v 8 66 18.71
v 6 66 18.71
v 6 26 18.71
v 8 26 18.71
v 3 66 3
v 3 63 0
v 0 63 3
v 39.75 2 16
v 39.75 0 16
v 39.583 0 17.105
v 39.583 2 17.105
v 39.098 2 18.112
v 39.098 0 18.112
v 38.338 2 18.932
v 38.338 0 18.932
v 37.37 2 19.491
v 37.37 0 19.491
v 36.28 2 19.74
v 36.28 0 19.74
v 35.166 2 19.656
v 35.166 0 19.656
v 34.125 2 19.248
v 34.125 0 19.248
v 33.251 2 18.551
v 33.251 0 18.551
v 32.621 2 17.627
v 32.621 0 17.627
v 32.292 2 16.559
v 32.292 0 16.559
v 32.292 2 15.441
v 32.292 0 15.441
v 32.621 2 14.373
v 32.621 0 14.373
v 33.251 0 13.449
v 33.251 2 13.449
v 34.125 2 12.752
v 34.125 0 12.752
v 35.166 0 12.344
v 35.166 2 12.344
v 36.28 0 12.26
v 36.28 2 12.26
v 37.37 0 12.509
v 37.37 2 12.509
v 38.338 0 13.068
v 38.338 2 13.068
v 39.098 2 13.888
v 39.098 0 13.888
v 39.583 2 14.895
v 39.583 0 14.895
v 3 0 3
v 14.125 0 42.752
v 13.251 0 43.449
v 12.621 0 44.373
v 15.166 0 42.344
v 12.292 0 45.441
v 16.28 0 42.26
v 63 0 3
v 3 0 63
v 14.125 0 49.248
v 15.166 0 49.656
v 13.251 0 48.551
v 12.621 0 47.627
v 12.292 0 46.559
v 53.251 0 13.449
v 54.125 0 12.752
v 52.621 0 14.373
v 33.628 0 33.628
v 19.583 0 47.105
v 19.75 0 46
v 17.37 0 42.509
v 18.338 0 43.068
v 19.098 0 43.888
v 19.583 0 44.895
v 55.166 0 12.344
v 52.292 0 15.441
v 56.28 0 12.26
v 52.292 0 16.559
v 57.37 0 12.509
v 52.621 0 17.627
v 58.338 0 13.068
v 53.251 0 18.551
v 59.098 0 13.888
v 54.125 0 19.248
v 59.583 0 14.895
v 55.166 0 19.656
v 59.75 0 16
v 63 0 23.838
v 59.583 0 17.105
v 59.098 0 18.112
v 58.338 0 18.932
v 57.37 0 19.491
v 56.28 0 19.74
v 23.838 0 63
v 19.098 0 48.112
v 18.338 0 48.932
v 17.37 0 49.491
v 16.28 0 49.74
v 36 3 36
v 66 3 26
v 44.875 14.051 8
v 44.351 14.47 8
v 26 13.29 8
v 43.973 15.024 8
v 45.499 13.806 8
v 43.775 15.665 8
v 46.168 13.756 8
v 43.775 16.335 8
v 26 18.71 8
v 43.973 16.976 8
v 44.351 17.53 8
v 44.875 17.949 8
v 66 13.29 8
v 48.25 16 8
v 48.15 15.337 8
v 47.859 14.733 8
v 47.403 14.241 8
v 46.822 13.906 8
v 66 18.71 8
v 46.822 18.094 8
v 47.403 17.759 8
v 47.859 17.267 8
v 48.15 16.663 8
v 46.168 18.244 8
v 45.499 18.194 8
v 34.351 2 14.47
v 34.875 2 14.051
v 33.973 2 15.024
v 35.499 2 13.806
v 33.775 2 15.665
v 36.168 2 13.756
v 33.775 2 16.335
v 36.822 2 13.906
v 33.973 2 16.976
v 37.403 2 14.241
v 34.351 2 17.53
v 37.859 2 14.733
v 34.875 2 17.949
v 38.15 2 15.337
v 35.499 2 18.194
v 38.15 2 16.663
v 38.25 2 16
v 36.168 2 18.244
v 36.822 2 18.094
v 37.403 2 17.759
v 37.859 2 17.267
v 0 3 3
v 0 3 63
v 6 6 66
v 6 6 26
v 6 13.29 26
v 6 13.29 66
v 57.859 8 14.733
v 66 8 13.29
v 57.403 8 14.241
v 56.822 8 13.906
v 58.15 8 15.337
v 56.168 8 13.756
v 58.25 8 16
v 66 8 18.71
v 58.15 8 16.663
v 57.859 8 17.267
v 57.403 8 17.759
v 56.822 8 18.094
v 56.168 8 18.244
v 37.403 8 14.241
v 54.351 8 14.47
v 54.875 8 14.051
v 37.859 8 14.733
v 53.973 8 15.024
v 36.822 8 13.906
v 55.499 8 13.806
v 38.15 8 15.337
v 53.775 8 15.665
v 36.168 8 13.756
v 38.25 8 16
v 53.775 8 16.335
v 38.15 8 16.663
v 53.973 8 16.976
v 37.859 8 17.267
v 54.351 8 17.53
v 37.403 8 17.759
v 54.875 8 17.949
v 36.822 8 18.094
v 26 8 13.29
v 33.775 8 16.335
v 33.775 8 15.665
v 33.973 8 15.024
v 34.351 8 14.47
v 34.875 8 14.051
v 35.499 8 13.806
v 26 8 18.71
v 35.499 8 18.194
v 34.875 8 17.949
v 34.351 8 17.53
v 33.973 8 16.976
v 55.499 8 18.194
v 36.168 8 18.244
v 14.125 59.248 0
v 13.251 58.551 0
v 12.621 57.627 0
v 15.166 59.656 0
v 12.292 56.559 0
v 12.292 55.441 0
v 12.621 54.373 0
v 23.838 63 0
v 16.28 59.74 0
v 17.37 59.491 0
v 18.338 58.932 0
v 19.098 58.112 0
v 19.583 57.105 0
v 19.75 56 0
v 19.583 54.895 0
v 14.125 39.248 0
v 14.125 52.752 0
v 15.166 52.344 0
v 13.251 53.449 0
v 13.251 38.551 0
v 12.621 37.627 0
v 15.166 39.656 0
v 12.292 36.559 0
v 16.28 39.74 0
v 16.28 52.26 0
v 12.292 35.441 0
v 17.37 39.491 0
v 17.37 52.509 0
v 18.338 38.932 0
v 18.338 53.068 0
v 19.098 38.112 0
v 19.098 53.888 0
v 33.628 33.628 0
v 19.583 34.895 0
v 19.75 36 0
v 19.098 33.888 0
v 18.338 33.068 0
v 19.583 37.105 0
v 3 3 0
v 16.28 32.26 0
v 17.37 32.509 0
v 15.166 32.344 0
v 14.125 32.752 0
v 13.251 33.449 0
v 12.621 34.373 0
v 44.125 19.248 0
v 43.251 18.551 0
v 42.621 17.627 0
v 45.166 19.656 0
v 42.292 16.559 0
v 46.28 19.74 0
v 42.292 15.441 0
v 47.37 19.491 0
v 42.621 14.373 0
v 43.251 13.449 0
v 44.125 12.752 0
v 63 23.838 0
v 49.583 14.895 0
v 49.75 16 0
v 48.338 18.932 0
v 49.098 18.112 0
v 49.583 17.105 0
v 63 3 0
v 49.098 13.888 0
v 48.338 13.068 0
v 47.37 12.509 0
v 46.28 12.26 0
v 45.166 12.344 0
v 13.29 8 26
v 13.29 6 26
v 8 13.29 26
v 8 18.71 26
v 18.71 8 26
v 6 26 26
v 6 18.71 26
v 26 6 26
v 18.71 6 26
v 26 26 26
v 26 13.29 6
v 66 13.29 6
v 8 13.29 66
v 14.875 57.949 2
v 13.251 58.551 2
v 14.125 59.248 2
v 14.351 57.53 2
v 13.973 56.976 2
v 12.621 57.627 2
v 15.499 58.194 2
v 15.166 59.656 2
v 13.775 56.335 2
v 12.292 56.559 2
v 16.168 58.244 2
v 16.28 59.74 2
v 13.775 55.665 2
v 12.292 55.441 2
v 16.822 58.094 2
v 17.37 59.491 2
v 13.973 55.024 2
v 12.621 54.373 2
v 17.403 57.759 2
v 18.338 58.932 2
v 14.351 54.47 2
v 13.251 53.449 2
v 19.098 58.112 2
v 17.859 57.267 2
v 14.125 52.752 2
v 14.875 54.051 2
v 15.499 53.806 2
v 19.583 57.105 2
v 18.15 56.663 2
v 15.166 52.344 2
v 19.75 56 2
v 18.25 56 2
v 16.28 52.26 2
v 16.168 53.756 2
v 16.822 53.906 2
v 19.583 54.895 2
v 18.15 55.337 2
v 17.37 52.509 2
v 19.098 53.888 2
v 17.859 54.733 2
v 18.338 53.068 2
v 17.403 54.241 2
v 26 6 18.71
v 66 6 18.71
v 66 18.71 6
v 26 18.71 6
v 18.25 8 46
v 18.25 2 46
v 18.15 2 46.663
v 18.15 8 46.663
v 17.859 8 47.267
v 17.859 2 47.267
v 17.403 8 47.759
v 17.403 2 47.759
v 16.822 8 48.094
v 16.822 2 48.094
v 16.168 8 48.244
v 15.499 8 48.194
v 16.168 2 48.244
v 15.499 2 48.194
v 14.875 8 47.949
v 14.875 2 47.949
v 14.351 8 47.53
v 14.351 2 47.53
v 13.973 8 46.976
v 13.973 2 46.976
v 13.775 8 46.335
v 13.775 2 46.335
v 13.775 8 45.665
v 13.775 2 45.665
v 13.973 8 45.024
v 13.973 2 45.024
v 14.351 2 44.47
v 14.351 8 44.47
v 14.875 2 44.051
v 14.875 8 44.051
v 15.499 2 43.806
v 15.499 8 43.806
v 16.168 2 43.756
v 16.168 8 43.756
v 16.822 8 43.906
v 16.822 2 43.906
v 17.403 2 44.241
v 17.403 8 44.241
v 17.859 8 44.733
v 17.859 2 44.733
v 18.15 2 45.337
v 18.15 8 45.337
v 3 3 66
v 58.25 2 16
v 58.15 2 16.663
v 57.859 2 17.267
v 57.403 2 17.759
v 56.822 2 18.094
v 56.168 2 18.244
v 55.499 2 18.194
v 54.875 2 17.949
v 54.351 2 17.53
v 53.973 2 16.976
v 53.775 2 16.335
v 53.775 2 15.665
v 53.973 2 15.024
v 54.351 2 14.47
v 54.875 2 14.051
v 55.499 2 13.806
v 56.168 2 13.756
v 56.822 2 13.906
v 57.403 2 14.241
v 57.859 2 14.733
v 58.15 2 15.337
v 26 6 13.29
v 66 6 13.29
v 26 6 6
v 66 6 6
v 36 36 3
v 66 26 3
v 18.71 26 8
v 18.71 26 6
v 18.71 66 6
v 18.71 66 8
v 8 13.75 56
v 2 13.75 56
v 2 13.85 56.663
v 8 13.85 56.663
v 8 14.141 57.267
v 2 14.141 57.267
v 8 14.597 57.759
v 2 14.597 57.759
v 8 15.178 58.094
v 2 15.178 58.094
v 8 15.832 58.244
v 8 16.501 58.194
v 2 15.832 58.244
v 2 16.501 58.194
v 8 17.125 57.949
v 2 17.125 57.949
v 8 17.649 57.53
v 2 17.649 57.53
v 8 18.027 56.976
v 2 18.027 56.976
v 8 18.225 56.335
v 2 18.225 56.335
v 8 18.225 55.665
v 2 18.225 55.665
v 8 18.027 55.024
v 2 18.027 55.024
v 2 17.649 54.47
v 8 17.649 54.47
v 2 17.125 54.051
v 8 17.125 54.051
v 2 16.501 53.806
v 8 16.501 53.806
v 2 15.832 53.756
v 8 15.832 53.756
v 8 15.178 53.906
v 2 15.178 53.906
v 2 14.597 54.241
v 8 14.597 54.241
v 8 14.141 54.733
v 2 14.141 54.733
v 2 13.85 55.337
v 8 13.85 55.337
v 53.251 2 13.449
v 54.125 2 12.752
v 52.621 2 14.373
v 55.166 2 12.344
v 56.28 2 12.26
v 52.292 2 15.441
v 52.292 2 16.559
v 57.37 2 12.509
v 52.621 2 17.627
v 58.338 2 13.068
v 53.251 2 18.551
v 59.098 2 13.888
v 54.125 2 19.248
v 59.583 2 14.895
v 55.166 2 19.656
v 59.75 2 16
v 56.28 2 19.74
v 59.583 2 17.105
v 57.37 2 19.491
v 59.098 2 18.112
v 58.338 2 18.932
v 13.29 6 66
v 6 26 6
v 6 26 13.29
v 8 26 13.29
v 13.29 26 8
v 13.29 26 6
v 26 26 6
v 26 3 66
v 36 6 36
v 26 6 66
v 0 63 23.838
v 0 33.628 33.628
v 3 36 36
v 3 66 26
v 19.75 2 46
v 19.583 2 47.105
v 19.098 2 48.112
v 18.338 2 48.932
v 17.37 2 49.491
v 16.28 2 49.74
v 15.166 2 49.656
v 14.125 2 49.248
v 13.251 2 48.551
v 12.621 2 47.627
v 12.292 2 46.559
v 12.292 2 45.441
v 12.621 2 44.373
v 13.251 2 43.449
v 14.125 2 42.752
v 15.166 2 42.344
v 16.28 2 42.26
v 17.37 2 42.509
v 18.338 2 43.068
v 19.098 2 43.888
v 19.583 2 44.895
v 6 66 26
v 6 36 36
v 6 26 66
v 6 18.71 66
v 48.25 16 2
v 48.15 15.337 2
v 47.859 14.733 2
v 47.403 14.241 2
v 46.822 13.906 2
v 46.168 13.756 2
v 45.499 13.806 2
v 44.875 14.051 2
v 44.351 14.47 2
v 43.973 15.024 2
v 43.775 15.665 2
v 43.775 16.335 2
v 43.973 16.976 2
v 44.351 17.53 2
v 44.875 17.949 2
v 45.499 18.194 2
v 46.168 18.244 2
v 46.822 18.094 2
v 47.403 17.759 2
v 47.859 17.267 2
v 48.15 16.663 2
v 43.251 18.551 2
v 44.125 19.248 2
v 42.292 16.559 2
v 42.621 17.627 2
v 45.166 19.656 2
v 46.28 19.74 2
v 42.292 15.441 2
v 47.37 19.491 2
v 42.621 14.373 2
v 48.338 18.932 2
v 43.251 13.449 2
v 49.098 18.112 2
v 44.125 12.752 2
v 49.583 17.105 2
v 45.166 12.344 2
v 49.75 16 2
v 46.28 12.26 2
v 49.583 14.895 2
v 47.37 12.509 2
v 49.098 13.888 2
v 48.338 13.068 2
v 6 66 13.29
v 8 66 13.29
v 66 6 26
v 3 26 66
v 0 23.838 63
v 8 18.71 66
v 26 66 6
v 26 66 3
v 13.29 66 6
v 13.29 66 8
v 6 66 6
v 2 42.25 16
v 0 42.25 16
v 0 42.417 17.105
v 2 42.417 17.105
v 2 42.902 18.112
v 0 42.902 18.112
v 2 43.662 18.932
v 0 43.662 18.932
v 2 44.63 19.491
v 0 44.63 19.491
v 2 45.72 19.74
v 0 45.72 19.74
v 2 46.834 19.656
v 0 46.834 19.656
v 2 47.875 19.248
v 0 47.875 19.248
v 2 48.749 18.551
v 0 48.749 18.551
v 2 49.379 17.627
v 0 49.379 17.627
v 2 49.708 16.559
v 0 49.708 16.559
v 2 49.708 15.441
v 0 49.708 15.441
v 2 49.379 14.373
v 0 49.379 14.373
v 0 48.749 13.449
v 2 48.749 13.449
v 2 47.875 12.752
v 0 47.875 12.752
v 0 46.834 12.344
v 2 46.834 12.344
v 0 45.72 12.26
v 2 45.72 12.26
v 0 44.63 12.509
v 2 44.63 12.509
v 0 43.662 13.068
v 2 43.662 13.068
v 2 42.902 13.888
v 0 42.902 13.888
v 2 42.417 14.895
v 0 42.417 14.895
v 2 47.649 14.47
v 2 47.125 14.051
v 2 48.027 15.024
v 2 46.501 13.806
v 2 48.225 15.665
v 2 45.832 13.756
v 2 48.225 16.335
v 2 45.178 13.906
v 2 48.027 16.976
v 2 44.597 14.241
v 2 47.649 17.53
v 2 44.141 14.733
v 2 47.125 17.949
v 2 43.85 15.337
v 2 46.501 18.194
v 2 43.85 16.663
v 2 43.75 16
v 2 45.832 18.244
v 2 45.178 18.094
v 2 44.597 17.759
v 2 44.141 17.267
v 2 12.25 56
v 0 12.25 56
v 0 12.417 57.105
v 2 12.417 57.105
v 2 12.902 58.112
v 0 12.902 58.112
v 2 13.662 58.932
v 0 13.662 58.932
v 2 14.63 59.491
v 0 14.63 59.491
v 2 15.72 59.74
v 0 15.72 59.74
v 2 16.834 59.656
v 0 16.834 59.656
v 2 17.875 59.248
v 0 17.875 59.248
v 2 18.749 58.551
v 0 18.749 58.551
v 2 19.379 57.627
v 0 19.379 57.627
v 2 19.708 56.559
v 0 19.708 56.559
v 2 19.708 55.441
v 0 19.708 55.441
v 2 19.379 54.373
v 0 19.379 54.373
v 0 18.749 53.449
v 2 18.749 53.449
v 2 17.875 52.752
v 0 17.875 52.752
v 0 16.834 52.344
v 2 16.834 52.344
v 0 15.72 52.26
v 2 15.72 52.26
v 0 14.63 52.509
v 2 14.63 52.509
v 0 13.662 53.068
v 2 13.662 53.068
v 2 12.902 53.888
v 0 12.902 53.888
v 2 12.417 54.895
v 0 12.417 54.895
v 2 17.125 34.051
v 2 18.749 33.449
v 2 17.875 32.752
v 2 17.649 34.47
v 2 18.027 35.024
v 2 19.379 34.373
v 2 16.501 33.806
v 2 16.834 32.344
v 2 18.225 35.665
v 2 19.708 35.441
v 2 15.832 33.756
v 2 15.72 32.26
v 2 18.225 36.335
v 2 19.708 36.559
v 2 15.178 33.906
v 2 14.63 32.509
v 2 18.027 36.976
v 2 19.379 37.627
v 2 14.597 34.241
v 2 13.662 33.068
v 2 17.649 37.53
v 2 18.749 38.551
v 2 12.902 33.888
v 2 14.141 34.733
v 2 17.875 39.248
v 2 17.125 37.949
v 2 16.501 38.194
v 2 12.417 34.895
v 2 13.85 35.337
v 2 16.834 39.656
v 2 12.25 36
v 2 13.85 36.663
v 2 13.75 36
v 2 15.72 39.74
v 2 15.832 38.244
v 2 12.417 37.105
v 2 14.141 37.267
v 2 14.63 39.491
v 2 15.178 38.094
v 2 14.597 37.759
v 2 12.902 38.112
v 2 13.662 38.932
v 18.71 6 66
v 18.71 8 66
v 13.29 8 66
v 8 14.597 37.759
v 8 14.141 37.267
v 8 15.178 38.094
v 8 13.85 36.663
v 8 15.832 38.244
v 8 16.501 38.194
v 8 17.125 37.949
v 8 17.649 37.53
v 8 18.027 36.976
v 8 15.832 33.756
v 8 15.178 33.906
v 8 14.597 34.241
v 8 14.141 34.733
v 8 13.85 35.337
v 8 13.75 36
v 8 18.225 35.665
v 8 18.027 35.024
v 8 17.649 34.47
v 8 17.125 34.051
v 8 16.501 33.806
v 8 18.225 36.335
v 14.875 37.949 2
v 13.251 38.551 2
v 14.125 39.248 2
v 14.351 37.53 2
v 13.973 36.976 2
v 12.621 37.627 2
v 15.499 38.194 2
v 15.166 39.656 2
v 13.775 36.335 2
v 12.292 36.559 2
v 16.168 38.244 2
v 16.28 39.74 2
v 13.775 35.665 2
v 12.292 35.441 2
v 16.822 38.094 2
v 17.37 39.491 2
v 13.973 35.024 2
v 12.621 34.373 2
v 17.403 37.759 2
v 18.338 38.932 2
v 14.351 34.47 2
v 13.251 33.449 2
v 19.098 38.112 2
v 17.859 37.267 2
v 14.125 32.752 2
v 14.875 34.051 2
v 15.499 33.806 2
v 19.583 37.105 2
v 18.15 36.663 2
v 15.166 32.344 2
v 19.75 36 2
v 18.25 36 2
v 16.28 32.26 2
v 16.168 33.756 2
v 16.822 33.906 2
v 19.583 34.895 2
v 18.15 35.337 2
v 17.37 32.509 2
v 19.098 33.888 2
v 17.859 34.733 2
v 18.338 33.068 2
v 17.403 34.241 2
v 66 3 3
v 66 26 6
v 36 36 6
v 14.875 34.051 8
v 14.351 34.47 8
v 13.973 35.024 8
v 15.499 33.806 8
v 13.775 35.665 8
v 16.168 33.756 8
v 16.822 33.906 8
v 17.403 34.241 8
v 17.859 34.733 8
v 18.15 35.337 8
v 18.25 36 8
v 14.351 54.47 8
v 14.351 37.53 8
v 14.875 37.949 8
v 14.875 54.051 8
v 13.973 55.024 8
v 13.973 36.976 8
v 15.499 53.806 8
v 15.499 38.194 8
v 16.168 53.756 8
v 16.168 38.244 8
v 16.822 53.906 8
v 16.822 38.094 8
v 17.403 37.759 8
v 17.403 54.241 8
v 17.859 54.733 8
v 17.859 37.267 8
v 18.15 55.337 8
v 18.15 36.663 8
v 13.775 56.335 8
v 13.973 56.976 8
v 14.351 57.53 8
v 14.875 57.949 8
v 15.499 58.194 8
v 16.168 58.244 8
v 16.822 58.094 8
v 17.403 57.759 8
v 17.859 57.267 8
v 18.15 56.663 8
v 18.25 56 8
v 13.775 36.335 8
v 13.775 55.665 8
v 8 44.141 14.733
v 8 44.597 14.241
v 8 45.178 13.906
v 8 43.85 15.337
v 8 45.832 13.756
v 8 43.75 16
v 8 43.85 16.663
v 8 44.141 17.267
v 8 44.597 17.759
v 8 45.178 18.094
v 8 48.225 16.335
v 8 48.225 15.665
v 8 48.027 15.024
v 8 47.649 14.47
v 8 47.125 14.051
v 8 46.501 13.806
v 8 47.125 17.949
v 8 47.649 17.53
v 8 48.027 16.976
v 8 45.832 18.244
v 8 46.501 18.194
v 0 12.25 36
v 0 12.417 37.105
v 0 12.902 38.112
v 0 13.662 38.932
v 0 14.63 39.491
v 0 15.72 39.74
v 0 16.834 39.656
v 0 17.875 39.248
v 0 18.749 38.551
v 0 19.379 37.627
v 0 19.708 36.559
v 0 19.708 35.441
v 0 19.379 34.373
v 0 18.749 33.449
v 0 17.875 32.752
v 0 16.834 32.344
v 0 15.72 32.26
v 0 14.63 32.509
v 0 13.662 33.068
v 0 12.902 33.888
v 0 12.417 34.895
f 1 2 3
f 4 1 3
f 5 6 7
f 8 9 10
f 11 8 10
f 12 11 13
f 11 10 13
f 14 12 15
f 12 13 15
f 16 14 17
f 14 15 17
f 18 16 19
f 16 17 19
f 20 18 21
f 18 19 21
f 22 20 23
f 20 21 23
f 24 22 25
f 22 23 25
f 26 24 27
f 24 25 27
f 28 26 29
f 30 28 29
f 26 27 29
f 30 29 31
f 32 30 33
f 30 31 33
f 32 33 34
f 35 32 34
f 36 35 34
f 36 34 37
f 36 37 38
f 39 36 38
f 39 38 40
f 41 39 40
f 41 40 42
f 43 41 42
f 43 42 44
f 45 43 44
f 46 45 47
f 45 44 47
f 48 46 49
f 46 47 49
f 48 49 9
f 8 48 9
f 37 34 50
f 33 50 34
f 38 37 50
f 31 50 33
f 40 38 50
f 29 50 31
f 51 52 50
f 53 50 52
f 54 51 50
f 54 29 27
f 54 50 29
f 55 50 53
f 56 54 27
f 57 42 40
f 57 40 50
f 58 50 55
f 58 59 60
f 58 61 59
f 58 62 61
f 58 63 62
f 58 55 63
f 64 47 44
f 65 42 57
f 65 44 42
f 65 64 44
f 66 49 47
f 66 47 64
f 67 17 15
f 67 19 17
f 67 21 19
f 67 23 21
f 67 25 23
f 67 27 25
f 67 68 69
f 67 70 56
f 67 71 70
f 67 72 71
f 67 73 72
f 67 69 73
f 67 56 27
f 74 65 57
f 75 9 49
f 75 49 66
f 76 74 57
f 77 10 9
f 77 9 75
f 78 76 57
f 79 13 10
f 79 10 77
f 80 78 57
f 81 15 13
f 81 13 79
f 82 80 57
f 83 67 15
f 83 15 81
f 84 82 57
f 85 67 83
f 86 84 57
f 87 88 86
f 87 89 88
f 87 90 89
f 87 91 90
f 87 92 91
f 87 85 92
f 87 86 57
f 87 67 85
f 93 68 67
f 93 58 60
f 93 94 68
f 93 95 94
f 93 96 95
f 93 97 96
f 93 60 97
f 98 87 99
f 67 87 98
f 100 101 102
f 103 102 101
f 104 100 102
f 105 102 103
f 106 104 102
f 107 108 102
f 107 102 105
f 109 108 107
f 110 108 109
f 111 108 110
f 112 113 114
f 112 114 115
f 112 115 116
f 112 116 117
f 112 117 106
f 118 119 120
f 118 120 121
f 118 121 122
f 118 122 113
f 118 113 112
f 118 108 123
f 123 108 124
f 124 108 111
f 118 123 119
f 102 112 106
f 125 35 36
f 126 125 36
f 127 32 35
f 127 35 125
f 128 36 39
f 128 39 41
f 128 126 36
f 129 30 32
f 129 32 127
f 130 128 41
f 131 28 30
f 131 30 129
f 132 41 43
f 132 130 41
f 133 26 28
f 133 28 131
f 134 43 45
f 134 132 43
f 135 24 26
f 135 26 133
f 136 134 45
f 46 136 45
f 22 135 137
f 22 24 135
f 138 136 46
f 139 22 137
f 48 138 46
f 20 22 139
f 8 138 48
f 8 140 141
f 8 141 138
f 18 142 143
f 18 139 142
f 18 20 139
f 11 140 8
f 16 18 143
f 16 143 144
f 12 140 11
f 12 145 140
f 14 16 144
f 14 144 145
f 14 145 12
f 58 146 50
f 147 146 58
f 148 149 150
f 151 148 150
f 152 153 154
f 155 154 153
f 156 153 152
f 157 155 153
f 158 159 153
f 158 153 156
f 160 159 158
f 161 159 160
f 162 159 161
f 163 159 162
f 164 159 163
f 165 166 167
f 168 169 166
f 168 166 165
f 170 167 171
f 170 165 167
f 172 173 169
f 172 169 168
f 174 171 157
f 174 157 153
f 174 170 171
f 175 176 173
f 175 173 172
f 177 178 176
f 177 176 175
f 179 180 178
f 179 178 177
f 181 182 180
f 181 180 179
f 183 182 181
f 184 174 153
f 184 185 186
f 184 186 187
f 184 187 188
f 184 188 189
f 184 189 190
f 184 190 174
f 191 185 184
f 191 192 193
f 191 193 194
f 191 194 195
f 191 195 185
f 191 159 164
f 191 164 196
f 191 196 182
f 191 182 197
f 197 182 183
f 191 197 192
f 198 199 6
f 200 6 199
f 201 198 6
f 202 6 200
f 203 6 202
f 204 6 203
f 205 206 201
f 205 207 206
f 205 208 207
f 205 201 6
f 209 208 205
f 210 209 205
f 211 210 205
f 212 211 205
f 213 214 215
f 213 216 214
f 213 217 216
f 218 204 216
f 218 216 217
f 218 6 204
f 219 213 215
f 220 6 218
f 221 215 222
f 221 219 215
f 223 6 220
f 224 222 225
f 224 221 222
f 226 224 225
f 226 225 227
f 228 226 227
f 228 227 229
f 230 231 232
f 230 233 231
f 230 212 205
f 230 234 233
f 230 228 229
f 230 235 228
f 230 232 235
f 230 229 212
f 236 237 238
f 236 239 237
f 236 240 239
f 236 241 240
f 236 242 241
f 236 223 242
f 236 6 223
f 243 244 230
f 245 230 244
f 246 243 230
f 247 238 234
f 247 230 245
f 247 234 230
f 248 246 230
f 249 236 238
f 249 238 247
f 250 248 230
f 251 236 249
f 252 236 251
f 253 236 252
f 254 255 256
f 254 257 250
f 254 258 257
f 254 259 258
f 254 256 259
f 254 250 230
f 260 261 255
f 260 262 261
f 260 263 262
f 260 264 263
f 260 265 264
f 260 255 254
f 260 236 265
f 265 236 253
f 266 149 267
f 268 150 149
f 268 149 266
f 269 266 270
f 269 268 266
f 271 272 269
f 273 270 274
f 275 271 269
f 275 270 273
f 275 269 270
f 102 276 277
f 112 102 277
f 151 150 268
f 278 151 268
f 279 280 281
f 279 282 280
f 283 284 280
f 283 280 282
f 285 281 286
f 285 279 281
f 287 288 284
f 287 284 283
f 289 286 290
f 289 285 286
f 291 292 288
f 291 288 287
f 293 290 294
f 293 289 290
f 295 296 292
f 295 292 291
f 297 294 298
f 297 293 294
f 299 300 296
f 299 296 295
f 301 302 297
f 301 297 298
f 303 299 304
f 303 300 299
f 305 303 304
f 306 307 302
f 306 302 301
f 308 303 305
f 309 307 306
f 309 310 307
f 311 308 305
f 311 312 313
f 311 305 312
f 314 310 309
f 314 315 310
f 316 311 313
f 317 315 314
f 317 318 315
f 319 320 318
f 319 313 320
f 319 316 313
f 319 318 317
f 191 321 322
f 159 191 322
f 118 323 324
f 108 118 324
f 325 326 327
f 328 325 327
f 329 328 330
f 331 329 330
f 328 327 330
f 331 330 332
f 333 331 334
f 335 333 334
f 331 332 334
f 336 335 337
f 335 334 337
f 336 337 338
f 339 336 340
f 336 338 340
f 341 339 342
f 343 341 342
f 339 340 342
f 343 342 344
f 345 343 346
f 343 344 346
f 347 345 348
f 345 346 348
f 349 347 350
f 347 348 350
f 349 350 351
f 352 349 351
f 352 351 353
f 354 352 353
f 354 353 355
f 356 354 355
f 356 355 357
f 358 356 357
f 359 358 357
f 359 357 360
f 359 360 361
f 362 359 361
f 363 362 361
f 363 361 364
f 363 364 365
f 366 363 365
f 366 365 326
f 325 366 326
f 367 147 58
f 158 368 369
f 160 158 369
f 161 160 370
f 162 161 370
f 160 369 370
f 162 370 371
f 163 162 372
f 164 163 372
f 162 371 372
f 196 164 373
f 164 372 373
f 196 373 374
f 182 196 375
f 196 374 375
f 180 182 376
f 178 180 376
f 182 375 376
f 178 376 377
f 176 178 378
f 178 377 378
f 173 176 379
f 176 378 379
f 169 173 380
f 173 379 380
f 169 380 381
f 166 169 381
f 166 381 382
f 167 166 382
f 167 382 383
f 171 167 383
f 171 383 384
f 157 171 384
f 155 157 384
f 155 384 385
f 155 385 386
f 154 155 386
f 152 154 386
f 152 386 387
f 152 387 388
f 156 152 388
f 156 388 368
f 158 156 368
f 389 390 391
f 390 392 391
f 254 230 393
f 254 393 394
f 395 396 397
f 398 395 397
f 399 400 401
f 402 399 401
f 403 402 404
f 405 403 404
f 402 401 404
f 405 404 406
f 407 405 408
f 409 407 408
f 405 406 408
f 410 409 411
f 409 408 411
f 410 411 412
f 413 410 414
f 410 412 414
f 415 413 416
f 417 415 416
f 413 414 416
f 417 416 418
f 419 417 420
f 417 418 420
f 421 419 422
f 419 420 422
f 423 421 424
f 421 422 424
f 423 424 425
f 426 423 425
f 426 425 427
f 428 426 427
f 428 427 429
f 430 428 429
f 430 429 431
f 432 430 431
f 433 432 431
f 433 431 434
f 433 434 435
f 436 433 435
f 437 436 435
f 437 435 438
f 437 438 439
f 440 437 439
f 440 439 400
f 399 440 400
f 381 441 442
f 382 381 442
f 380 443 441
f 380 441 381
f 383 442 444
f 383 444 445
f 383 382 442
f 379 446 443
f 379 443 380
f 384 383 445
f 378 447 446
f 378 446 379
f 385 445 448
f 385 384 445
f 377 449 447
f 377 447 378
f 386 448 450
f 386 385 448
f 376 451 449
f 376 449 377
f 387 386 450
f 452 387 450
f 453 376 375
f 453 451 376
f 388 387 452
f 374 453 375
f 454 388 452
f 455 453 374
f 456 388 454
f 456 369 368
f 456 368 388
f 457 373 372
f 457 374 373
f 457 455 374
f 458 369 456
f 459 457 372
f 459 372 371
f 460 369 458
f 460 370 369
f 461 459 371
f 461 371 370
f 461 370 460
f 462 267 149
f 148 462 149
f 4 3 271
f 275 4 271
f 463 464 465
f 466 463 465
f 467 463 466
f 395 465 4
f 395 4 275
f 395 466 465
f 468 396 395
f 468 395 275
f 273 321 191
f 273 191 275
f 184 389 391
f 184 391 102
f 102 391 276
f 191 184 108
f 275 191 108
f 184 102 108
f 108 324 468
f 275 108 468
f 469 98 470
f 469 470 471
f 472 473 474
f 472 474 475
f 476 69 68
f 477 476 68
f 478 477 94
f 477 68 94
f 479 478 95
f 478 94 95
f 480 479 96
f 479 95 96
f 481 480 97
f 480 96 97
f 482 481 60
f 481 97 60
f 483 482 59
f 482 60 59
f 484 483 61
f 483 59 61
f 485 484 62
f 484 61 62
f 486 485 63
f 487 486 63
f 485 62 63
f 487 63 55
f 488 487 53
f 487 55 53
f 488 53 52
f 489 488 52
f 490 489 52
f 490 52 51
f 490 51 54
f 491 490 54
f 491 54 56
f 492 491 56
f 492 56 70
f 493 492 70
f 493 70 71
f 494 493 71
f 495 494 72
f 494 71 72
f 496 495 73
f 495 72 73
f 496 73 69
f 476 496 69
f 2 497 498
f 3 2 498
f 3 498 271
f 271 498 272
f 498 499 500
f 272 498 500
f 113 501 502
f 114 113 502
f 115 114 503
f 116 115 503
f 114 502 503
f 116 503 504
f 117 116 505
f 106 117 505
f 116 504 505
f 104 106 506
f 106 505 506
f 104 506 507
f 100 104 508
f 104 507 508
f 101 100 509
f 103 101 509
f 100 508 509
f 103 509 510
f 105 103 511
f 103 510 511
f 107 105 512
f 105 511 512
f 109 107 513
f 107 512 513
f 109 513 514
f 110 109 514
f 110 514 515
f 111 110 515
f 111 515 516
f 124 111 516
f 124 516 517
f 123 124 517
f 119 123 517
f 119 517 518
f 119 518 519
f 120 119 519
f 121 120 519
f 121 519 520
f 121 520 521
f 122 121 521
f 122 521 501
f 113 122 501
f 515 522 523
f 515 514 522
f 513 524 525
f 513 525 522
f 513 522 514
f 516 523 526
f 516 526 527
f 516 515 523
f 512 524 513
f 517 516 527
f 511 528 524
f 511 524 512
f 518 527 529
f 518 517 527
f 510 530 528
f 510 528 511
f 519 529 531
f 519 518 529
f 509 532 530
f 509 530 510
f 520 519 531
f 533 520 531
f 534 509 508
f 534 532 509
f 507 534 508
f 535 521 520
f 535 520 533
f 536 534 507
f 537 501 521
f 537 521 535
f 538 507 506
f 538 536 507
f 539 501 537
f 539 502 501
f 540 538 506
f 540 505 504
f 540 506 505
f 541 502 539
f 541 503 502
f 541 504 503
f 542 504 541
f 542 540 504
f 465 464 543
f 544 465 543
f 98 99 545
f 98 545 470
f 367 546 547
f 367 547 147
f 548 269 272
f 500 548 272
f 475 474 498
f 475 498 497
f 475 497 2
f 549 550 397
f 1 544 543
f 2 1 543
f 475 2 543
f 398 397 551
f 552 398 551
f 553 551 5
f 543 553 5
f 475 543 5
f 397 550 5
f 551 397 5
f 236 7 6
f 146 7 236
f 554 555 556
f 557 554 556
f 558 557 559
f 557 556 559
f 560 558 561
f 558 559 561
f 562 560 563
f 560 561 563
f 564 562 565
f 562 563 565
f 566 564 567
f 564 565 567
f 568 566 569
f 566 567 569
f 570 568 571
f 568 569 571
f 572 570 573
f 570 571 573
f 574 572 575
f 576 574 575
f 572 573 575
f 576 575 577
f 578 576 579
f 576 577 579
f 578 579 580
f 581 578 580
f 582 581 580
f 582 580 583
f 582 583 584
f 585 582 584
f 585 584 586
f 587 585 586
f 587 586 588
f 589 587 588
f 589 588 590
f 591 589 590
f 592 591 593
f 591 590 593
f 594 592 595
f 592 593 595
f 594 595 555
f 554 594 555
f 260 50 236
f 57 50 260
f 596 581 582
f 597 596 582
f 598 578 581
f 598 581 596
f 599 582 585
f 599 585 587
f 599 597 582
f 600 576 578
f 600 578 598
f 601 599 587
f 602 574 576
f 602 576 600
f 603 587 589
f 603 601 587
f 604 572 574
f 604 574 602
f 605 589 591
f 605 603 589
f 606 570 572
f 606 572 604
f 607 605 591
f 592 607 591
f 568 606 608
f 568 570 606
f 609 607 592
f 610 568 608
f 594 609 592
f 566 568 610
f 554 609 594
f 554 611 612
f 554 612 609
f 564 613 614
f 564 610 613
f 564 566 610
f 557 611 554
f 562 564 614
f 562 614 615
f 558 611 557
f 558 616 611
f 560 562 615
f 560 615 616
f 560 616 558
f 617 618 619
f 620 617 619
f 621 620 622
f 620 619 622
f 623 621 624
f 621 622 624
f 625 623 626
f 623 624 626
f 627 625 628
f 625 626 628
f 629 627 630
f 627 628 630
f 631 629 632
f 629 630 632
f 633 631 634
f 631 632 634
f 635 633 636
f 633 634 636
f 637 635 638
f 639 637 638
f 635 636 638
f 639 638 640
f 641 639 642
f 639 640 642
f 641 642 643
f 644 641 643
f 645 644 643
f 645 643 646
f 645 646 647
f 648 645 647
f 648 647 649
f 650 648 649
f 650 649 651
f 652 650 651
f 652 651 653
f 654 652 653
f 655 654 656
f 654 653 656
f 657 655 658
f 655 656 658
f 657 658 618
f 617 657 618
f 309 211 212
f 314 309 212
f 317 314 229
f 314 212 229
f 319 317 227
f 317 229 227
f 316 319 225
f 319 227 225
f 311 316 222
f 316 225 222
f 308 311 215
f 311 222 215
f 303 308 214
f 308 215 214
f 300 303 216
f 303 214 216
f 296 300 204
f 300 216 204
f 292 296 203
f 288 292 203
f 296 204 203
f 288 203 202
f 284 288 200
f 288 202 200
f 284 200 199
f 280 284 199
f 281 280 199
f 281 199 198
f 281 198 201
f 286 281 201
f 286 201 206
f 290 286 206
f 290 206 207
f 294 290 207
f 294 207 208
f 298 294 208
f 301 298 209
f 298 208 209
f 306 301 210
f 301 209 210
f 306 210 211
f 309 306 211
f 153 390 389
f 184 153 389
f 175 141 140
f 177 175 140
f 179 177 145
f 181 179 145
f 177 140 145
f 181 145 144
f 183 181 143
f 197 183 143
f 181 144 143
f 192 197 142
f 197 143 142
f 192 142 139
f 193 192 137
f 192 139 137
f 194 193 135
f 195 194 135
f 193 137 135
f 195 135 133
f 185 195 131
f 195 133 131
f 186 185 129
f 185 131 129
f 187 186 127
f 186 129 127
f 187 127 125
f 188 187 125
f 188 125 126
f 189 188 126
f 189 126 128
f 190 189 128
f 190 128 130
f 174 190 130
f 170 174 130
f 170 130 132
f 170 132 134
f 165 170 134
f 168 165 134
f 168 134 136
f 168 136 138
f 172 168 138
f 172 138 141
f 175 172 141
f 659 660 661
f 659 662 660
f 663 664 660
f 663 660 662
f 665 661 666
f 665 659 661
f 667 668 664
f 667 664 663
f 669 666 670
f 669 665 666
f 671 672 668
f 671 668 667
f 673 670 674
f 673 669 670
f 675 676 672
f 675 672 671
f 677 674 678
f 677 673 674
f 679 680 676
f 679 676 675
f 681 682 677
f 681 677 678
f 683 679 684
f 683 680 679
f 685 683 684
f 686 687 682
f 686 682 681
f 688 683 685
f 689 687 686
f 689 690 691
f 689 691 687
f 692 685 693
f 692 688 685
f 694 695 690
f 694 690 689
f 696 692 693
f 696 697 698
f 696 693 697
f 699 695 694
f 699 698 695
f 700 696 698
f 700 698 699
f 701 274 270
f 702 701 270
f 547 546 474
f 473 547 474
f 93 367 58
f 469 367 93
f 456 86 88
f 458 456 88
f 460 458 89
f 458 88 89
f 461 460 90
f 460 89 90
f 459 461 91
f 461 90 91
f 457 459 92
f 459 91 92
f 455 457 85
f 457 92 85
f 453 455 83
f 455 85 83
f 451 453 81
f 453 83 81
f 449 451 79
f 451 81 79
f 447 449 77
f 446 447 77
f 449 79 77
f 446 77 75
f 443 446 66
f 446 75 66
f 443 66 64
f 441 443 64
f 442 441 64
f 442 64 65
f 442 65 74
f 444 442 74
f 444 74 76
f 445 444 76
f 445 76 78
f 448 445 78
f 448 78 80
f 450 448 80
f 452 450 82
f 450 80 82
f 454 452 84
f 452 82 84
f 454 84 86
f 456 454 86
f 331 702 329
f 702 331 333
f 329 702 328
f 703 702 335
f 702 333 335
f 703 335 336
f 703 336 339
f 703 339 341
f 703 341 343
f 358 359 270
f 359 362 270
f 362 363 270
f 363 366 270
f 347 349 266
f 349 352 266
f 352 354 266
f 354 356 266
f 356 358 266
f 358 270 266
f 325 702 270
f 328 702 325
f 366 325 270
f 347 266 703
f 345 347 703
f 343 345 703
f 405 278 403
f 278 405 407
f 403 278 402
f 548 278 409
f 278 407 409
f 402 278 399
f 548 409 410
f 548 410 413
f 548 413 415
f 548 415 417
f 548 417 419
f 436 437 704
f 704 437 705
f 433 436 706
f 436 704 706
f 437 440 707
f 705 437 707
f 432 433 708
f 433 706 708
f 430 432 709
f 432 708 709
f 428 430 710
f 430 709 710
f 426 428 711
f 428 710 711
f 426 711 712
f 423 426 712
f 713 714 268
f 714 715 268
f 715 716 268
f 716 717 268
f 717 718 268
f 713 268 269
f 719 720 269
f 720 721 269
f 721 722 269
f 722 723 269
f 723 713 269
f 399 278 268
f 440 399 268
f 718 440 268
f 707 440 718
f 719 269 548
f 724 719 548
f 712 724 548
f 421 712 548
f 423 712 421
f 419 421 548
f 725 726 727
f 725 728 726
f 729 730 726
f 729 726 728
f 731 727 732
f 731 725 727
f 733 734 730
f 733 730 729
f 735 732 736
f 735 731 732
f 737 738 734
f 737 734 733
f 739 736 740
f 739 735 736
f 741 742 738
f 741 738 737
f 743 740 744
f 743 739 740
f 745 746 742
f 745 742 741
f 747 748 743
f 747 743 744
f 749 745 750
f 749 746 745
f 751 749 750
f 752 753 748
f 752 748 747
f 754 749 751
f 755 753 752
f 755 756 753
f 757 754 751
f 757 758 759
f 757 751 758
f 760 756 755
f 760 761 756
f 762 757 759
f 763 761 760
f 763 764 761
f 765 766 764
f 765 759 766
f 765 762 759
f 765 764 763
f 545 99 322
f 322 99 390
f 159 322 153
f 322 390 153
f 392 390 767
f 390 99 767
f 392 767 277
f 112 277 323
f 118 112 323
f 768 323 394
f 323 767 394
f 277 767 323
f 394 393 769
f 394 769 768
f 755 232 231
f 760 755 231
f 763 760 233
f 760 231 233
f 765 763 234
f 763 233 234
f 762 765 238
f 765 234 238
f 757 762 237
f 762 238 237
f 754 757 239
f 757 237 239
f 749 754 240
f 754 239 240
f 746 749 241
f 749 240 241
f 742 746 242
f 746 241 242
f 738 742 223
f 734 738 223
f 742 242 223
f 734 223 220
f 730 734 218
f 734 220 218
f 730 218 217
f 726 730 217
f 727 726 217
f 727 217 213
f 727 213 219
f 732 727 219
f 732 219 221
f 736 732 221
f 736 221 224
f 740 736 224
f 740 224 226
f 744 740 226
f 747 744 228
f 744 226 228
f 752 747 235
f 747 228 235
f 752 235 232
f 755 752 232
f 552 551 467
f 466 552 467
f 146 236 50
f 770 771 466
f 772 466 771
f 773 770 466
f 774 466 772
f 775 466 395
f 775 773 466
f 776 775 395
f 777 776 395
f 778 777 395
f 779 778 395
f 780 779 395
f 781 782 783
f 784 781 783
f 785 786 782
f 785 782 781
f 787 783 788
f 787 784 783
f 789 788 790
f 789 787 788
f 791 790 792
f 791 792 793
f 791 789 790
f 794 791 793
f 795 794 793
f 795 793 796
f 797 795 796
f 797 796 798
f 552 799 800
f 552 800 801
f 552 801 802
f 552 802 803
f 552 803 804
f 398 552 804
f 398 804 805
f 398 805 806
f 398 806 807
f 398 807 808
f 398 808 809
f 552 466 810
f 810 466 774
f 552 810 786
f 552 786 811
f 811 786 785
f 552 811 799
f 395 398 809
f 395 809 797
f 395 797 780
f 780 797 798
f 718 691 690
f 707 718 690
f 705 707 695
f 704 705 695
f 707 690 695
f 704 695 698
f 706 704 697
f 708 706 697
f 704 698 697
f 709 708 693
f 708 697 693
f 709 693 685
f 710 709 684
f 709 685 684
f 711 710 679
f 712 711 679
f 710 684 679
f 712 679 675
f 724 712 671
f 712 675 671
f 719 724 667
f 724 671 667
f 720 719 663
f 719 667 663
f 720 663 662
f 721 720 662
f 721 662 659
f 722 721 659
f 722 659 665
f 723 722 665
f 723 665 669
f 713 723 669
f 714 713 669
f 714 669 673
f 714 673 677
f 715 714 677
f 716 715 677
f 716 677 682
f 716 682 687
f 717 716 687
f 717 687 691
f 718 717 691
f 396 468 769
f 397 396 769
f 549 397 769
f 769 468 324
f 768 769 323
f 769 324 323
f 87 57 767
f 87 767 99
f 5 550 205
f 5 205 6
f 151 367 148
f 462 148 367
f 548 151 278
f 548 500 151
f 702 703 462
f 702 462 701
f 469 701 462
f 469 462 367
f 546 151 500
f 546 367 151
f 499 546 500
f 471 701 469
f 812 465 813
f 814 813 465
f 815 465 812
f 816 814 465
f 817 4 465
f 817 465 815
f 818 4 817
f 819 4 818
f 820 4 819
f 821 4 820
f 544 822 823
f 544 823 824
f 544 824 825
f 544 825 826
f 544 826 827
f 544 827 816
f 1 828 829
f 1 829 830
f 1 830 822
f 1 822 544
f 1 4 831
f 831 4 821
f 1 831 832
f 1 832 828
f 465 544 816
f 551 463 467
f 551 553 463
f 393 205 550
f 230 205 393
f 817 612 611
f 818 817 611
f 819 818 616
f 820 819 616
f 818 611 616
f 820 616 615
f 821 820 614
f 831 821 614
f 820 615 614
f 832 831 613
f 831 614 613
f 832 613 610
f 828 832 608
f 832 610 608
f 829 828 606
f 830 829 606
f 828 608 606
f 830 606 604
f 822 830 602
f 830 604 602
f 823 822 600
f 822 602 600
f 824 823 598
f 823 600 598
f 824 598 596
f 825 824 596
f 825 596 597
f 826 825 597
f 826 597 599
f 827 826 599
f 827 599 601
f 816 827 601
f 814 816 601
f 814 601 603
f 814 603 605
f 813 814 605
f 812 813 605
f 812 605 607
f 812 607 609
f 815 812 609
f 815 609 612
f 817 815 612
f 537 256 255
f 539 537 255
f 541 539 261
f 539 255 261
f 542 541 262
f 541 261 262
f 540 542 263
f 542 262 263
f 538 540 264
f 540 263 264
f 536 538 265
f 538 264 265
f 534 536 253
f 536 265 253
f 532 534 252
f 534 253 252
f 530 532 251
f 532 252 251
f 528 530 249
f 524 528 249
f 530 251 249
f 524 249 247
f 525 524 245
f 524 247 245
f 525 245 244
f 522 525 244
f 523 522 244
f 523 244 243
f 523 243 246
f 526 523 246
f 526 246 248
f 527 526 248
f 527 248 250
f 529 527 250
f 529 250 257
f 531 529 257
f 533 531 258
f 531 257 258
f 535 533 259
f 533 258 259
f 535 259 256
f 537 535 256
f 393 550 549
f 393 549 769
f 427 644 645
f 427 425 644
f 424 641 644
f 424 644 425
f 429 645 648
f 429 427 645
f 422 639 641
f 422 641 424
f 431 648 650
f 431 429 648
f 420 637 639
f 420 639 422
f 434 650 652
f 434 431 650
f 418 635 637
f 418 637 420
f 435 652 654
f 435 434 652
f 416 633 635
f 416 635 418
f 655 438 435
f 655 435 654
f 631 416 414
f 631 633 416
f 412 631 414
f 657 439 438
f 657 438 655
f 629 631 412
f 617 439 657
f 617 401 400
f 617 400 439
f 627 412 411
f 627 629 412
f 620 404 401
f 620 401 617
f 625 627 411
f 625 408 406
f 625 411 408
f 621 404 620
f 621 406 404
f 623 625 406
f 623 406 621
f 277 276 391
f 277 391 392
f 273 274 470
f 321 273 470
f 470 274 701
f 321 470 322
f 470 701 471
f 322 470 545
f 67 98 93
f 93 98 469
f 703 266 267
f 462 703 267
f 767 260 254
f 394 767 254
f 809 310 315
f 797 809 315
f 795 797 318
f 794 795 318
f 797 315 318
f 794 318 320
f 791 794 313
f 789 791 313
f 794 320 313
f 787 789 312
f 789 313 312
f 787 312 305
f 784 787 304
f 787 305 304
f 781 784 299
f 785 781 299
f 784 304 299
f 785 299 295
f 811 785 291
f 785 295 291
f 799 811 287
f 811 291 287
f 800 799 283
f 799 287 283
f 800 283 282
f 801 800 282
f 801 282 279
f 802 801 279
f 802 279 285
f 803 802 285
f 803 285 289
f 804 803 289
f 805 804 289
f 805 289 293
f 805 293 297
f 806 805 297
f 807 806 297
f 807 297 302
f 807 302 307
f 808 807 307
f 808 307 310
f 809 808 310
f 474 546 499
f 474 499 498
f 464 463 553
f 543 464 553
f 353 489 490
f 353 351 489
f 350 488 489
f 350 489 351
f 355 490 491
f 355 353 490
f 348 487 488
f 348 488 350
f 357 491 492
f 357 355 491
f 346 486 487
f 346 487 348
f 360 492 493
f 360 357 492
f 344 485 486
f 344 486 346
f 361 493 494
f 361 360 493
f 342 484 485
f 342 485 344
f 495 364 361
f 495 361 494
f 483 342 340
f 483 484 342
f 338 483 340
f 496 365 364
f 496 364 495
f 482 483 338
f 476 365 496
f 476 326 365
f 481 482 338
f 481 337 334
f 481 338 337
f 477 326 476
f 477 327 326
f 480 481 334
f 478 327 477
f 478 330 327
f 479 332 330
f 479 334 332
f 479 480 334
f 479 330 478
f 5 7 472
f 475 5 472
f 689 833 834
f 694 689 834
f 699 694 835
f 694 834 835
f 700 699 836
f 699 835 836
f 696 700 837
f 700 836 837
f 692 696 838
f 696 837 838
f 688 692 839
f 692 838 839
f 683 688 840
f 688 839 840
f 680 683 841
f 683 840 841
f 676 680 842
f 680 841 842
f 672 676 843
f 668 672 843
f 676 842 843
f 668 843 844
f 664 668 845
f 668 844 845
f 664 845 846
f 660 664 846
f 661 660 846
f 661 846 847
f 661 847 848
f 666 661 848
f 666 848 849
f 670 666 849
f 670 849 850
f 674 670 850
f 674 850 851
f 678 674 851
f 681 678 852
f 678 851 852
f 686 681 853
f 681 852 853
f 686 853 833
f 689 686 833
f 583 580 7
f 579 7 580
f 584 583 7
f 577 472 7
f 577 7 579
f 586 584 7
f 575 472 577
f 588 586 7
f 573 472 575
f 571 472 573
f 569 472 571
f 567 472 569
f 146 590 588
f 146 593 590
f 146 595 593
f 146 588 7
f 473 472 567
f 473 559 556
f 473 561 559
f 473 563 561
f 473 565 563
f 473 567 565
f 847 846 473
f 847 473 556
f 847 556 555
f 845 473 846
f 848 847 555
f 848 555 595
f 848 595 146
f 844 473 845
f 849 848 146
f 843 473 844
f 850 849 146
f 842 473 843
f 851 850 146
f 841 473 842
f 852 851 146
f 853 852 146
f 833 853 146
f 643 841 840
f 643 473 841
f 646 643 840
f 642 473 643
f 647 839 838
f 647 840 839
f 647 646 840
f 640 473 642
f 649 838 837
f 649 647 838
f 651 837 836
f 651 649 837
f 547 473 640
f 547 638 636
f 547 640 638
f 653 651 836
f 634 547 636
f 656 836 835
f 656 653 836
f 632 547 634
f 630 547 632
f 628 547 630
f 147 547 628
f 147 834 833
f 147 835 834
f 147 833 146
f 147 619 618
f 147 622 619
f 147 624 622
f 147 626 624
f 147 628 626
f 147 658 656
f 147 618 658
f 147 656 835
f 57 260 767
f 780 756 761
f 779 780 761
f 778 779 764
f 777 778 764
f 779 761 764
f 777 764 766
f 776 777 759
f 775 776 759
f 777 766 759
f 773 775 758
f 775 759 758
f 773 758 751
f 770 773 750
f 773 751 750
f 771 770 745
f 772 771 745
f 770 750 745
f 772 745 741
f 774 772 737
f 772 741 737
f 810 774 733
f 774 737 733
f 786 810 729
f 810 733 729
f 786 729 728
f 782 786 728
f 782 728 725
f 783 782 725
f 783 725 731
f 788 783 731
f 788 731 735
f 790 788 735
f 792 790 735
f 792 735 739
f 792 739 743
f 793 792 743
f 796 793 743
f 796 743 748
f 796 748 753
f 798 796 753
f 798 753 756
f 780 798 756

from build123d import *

# Parameters (mm, degrees)
F1_DEPTH  = 6
F3_DEPTH  = 20
F5_DEPTH  = 40
F7_DEPTH  = 60
F9_DEPTH  = 2
F11_DEPTH = 2
F13_DEPTH = 2
F14_R     = 2.25
F15_DEPTH = 8
F16_R     = 2.25
F17_DEPTH = 8
F18_R     = 2.25
F19_DEPTH = 8
F20_R     = 3.75
F21_DEPTH = 2
F22_R     = 3.75
F23_DEPTH = 2
F24_R     = 3.75
F25_DEPTH = 2
F26_W     = 20
F26_H     = 20
F27_DEPTH = 20
F29_DEPTH = 6
F31_DEPTH = 6
F33_DEPTH = 6
F34_SIZE  = 3


with BuildPart() as f1:
    # F0 (on Top) → F1 (new body)
    with BuildSketch(Plane.XY):
        Polygon((0, 66), (0, 0), (66, 0), (66, 26), (26, 26), (26, 66), align=None)
    extrude(amount=F1_DEPTH)

    # F2 (on face) → F3 (join)
    with BuildSketch(Plane.XY.offset(6)):
        Polygon((6, 66), (0, 66), (0, 0), (66, 0), (66, 6), (6, 6), align=None)
    extrude(amount=F3_DEPTH)

    # F4 (on face) → F5 (join)
    with BuildSketch(Plane.XY.offset(26)):
        Polygon((6, 6), (6, 26), (0, 26), (0, 0), (26, 0), (26, 6), align=None)
    extrude(amount=F5_DEPTH)

    # F6 (on face) → F7 (join)
    with BuildSketch(Plane.XY.offset(6)):
        Polygon((13.29, 6), (16, 6), (18.71, 6), (18.71, 8), (13.29, 8), align=None)
        Polygon((6, 18.71), (6, 16), (6, 13.29), (8, 13.29), (8, 18.71), align=None)
    extrude(amount=F7_DEPTH)

    # F8 (on face) → F9 (join)
    with BuildSketch(Plane.XY.offset(6)):
        Polygon((66, 13.29), (66, 16), (66, 18.71), (26, 18.71), (26, 13.29), align=None)
        Polygon((18.71, 66), (16, 66), (13.29, 66), (13.29, 26), (18.71, 26), align=None)
    extrude(amount=F9_DEPTH)

    # F10 (on face) → F11 (join)
    with BuildSketch(Plane(origin=(0, 6, 0), x_dir=(-1, 0, 0), z_dir=(0, 1, 0))):
        Polygon((-66, 18.71), (-66, 16), (-66, 13.29), (-26, 13.29), (-26, 16), (-26, 18.71), align=None)
    extrude(amount=F11_DEPTH)

    # F12 (on face) → F13 (join)
    with BuildSketch(Plane.YZ.offset(6)):
        Polygon((66, 13.29), (66, 16), (66, 18.71), (26, 18.71), (26, 13.29), align=None)
    extrude(amount=F13_DEPTH)

    # F14 (on face) → F15 (cut, through all)
    with BuildSketch(Plane.XZ):
        with Locations((56, 16)):
            Circle(F14_R)
        with Locations((16, 46)):
            Circle(F14_R)
        with Locations((36, 16)):
            Circle(F14_R)
    extrude(amount=-F15_DEPTH, mode=Mode.SUBTRACT)

    # F16 (on face) → F17 (cut, through all)
    with BuildSketch(Plane(origin=(0, 0, 0), x_dir=(0, -1, 0), z_dir=(-1, 0, 0))):
        with Locations((-16, 56)):
            Circle(F16_R)
        with Locations((-46, 16)):
            Circle(F16_R)
        with Locations((-16, 36)):
            Circle(F16_R)
    extrude(amount=-F17_DEPTH, mode=Mode.SUBTRACT)

    # F18 (on face) → F19 (cut, through all)
    with BuildSketch(Plane(origin=(0, 0, 0), x_dir=(1, 0, 0), z_dir=(0, 0, -1))):
        with Locations((46, -16)):
            Circle(F18_R)
        with Locations((16, -56)):
            Circle(F18_R)
        with Locations((16, -36)):
            Circle(F18_R)
    extrude(amount=-F19_DEPTH, mode=Mode.SUBTRACT)

    # F20 (on face) → F21 (cut)
    with BuildSketch(Plane.XZ):
        with Locations((16, 46)):
            Circle(F20_R)
        with Locations((36, 16)):
            Circle(F20_R)
        with Locations((56, 16)):
            Circle(F20_R)
    extrude(amount=-F21_DEPTH, mode=Mode.SUBTRACT)

    # F22 (on face) → F23 (cut)
    with BuildSketch(Plane(origin=(0, 0, 0), x_dir=(0, -1, 0), z_dir=(-1, 0, 0))):
        with Locations((-16, 56)):
            Circle(F22_R)
        with Locations((-46, 16)):
            Circle(F22_R)
        with Locations((-16, 36)):
            Circle(F22_R)
    extrude(amount=-F23_DEPTH, mode=Mode.SUBTRACT)

    # F24 (on face) → F25 (cut)
    with BuildSketch(Plane(origin=(0, 0, 0), x_dir=(1, 0, 0), z_dir=(0, 0, -1))):
        with Locations((16, -56)):
            Circle(F24_R)
        with Locations((46, -16)):
            Circle(F24_R)
        with Locations((16, -36)):
            Circle(F24_R)
    extrude(amount=-F25_DEPTH, mode=Mode.SUBTRACT)

    # F26 (on face) → F27 (join)
    with BuildSketch(Plane.XY.offset(6)):
        with Locations((16, 16)):
            Rectangle(F26_W, F26_H)
    extrude(amount=F27_DEPTH)

    # F28 (on face) → F29 (join)
    with BuildSketch(Plane.XZ):
        Polygon((36, 36), (26, 66), (26, 26), (66, 26), align=None)
    extrude(amount=-F29_DEPTH)

    # F30 (on face) → F31 (join)
    with BuildSketch(Plane(origin=(0, 0, 0), x_dir=(0, -1, 0), z_dir=(-1, 0, 0))):
        Polygon((-26, 26), (-26, 66), (-36, 36), (-66, 26), align=None)
    extrude(amount=-F31_DEPTH)

    # F32 (on face) → F33 (join)
    with BuildSketch(Plane(origin=(0, 0, 0), x_dir=(1, 0, 0), z_dir=(0, 0, -1))):
        Polygon((36, -36), (66, -26), (26, -26), (26, -66), align=None)
    extrude(amount=-F33_DEPTH)

    # F34
    f34_edges = [f1.edges().sort_by_distance(p)[0] for p in [
        (33, 0, 0),
        (66, 13, 0),
        (51, 31, 0),
        (31, 51, 0),
        (13, 66, 0),
        (0, 33, 0),
        (0, 66, 13),
        (0, 51, 31),
        (0, 31, 51),
        (0, 13, 66),
        (0, 0, 33),
        (66, 0, 13),
        (51, 0, 31),
        (31, 0, 51),
        (13, 0, 66),
    ]]
    chamfer(f34_edges, length=F34_SIZE)


solid = f1.part
